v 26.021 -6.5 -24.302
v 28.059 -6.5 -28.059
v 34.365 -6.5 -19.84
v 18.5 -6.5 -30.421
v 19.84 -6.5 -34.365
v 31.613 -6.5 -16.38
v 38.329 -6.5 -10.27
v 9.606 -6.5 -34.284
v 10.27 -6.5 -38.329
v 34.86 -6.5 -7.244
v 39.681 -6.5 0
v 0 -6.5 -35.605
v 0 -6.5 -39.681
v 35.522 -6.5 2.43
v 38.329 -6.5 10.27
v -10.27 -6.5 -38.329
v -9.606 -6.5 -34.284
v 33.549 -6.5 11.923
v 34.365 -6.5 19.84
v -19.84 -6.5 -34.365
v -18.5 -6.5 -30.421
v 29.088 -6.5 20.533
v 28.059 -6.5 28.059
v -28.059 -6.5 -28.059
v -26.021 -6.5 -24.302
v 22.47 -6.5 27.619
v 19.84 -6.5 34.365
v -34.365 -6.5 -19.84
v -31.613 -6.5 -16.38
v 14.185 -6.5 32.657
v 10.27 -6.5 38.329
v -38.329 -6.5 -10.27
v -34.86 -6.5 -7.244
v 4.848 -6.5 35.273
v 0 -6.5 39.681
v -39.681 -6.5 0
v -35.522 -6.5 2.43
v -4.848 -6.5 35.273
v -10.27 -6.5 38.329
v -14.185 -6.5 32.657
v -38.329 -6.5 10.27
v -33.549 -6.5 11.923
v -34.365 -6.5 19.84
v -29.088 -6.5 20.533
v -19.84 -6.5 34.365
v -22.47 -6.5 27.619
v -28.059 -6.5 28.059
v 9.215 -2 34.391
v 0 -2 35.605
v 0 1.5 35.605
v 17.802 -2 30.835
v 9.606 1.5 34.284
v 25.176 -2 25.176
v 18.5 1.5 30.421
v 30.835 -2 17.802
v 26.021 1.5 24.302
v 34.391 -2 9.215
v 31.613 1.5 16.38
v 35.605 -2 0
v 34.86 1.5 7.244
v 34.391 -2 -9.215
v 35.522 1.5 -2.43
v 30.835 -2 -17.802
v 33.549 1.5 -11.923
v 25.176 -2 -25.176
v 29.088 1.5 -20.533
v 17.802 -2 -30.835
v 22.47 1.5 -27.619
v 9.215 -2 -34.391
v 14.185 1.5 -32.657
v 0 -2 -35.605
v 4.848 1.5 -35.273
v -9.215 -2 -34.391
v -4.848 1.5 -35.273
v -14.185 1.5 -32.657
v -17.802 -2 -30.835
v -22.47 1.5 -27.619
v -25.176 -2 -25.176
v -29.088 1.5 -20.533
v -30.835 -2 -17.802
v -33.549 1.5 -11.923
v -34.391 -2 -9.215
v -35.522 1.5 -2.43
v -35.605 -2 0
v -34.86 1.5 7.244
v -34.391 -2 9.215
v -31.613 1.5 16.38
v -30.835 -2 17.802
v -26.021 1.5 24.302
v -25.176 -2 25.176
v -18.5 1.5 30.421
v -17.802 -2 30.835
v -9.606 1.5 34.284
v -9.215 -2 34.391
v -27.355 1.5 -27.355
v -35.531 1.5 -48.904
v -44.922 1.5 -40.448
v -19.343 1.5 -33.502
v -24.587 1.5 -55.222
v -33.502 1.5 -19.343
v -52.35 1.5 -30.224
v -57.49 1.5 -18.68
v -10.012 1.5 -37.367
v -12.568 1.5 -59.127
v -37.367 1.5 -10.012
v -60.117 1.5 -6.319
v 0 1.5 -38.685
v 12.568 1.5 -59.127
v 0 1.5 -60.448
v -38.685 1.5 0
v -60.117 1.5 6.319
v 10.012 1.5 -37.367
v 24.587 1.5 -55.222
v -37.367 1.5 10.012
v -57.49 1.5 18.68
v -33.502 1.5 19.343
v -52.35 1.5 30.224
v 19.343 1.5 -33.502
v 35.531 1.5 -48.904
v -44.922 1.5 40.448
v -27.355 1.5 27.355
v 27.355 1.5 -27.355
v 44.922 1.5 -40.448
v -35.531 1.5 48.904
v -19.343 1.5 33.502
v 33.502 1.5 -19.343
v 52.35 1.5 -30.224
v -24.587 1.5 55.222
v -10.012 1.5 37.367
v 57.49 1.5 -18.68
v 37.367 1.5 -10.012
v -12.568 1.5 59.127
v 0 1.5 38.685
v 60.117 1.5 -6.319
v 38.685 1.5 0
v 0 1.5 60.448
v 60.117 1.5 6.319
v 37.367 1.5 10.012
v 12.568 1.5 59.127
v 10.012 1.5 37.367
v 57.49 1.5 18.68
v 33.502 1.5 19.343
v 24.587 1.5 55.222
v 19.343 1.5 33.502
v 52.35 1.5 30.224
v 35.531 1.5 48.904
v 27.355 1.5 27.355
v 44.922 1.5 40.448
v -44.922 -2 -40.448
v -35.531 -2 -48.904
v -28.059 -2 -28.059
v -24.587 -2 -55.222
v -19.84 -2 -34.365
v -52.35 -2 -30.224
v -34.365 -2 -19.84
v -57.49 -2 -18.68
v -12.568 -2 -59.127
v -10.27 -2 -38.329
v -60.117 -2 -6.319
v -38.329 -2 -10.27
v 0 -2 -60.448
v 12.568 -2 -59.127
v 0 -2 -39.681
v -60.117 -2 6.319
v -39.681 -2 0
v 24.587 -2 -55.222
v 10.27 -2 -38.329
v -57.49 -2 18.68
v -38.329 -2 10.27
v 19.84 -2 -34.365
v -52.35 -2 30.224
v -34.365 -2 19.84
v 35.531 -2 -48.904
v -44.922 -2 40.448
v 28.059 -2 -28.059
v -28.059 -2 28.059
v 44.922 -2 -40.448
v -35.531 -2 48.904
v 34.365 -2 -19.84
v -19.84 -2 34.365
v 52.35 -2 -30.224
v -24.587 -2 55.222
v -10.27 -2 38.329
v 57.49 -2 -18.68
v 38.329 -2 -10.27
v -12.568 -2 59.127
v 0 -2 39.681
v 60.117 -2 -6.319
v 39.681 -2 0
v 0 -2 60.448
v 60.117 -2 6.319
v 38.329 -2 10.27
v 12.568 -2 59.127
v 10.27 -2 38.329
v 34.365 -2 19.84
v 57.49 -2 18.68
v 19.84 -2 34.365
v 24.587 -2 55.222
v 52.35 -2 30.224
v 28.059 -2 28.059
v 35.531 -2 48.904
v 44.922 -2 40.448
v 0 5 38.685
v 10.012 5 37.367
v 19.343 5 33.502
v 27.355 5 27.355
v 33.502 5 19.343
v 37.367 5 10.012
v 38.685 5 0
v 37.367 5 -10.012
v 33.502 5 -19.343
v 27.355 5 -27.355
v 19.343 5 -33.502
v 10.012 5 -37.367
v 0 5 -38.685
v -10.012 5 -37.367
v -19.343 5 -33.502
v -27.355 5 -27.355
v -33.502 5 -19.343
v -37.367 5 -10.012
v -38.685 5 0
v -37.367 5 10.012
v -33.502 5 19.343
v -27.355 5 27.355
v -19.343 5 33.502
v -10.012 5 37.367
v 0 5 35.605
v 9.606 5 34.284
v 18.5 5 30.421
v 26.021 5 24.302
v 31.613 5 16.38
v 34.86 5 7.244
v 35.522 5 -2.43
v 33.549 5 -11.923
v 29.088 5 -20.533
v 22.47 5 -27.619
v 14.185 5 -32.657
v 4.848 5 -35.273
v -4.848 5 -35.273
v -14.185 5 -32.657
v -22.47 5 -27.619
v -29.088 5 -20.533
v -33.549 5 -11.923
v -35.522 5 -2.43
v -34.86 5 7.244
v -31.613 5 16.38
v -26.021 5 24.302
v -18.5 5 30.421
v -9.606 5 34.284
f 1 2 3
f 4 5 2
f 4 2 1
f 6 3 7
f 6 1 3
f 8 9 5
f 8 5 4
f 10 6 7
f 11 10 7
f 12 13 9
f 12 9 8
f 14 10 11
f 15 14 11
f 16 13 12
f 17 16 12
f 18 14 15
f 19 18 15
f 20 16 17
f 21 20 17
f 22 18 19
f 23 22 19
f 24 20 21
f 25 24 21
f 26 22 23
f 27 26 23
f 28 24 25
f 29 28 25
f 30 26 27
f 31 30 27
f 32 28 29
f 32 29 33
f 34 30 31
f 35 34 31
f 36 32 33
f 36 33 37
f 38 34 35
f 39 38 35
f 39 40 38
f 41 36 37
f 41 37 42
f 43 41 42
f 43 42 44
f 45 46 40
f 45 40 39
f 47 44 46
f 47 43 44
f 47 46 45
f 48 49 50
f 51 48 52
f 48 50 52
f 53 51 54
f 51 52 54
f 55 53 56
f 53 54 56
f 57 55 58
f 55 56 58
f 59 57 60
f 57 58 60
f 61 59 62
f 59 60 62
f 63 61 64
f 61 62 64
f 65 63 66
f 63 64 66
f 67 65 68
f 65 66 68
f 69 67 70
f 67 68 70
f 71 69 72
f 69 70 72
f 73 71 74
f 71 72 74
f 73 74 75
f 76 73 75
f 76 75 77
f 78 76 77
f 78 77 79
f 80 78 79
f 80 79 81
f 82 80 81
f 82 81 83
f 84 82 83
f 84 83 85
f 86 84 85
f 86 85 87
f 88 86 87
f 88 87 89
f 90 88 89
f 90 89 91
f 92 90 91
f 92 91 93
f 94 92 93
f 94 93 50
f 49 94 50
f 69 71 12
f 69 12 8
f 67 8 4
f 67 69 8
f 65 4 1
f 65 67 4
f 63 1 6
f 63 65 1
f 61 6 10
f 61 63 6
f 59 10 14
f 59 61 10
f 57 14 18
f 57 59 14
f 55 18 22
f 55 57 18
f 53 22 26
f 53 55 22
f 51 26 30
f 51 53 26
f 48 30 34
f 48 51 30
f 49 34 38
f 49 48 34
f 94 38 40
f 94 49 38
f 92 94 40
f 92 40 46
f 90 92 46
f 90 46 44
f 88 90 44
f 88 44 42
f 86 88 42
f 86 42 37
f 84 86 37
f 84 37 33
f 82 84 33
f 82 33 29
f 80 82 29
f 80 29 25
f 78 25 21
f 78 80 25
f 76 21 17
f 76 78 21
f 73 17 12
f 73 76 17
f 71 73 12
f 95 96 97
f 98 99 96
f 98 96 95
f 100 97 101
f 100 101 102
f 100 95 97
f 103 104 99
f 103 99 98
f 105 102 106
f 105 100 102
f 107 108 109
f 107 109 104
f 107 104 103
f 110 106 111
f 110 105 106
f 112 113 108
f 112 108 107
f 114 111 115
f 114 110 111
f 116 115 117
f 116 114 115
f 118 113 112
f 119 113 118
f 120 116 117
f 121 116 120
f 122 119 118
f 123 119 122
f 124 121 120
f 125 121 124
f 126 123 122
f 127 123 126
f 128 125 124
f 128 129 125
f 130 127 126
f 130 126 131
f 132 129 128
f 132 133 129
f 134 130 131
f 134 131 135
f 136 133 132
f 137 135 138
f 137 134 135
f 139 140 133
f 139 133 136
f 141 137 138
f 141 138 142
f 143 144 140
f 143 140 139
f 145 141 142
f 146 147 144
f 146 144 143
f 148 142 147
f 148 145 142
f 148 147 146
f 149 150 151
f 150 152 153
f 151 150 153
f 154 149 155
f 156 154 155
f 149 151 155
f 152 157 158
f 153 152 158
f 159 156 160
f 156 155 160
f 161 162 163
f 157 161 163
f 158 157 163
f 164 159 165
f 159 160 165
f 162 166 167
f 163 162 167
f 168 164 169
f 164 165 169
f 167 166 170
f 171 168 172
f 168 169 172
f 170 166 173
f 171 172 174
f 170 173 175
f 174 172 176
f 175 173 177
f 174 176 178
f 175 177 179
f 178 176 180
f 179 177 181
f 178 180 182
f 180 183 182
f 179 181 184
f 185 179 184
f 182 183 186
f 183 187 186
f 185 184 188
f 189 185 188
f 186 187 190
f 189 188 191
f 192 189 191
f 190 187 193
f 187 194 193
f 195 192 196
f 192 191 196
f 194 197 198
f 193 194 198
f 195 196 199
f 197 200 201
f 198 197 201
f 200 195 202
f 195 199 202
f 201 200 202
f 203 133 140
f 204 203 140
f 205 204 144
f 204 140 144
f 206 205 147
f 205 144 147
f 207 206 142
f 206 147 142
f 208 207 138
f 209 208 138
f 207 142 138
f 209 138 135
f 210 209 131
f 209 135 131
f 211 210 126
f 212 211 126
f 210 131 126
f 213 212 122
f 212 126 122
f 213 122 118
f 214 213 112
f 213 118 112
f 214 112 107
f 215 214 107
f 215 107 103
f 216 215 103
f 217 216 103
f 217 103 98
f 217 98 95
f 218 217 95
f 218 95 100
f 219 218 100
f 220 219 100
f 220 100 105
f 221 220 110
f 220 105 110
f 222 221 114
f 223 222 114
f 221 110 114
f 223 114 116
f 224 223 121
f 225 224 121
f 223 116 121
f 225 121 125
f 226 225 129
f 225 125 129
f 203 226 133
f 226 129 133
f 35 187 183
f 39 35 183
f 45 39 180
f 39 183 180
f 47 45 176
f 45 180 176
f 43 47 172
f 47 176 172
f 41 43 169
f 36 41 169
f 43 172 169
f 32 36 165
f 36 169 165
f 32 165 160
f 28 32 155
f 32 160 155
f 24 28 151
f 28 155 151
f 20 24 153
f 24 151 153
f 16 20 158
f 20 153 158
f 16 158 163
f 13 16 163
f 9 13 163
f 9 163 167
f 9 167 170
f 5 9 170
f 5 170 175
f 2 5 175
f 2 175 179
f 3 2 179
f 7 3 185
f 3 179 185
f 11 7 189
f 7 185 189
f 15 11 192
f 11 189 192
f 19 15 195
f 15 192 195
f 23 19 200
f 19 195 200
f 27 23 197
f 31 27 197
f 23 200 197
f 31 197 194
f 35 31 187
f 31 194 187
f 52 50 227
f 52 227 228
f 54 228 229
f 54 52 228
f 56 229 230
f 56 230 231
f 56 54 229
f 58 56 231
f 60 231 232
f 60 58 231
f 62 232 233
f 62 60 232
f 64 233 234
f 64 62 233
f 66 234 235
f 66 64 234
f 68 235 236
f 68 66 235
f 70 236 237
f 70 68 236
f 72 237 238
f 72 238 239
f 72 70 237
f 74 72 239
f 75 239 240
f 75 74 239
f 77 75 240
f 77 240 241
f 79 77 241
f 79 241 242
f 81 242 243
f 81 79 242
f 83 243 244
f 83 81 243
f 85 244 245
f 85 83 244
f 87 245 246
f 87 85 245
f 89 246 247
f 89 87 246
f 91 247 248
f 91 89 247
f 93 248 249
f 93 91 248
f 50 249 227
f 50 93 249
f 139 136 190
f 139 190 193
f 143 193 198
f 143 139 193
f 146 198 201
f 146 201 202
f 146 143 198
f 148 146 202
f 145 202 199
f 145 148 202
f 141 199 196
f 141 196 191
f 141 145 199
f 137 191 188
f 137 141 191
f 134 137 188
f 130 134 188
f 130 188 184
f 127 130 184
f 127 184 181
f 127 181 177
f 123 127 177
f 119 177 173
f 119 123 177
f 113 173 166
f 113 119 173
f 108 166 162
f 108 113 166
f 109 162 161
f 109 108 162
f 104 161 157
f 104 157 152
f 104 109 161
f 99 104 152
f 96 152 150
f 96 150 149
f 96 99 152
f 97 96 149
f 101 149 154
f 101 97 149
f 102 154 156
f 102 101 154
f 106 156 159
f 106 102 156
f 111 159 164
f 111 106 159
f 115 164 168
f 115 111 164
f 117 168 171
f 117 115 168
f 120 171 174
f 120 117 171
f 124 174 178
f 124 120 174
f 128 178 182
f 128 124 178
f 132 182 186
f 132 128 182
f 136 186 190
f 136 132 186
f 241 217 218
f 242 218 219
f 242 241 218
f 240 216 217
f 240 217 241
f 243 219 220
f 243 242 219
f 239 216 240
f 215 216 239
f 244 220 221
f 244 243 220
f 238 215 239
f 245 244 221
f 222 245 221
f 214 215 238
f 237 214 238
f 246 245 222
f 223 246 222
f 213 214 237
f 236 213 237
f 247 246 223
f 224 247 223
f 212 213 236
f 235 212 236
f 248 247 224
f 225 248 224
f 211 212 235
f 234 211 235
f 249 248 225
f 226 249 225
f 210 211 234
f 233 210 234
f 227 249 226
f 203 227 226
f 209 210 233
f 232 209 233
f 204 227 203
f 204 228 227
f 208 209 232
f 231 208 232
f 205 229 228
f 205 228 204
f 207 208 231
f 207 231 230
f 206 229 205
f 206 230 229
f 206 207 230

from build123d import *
from build123d.topology import SkipClean

# Parameters (mm, degrees)
CROQUIS1_R              = 35.597110005
CROQUIS1_R_2            = 26.191176114
SALIENTE_EXTRUIR1_DEPTH = 1.5
CROQUIS2_R              = 60.448384053
SALIENTE_EXTRUIR2_DEPTH = 3.5
CROQUIS3_R              = 38.685318644
CROQUIS3_R_2            = 35.604684405
SALIENTE_EXTRUIR3_DEPTH = 3.5
CROQUIS4_R              = 35.604684405
CORTAR_EXTRUIR1_DEPTH   = 86.558542935
CROQUIS5_R              = 39.680725698
CROQUIS5_R_2            = 35.604684405
SALIENTE_EXTRUIR4_DEPTH = 4.5


with BuildPart() as part:
    # Croquis1 → Saliente-Extruir1 (new body)
    with BuildSketch(Plane(origin=(0, 0, 0), x_dir=(1, 0, 0), z_dir=(0, 1, 0))):
        Circle(CROQUIS1_R)
        Circle(CROQUIS1_R_2, mode=Mode.SUBTRACT)
    extrude(amount=SALIENTE_EXTRUIR1_DEPTH)

    # Croquis2 → Saliente-Extruir2 (add)
    with BuildSketch(Plane(origin=(0, 1.5, 0), x_dir=(1, 0, 0), z_dir=(0, 1, 0))):
        Circle(CROQUIS2_R)
    extrude(amount=-SALIENTE_EXTRUIR2_DEPTH)

    # Croquis3 → Saliente-Extruir3 (add)
    with BuildSketch(Plane(origin=(0, 1.5, 0), x_dir=(1, 0, 0), z_dir=(0, 1, 0))):
        Circle(CROQUIS3_R)
        Circle(CROQUIS3_R_2, mode=Mode.SUBTRACT)
    extrude(amount=SALIENTE_EXTRUIR3_DEPTH)

    # Croquis4 → Cortar-Extruir1 (cut, through all)
    with BuildSketch(Plane(origin=(0, 1.5, 0), x_dir=(1, 0, 0), z_dir=(0, 1, 0))):
        Circle(CROQUIS4_R)
    extrude(amount=-CORTAR_EXTRUIR1_DEPTH, mode=Mode.SUBTRACT)

    # Croquis5 → Saliente-Extruir4 (add)
    with SkipClean():  # the faces are left unmerged after this step: merging them gives an invalid solid
        with BuildSketch(Plane(origin=(0, -2, 0), x_dir=(-1, 0, 0), z_dir=(0, -1, 0))):
            Circle(CROQUIS5_R)
            Circle(CROQUIS5_R_2, mode=Mode.SUBTRACT)
        extrude(amount=SALIENTE_EXTRUIR4_DEPTH)
    add(part.part.scale(1), mode=Mode.REPLACE)  # the faces are merged on a copy


solid = part.part
